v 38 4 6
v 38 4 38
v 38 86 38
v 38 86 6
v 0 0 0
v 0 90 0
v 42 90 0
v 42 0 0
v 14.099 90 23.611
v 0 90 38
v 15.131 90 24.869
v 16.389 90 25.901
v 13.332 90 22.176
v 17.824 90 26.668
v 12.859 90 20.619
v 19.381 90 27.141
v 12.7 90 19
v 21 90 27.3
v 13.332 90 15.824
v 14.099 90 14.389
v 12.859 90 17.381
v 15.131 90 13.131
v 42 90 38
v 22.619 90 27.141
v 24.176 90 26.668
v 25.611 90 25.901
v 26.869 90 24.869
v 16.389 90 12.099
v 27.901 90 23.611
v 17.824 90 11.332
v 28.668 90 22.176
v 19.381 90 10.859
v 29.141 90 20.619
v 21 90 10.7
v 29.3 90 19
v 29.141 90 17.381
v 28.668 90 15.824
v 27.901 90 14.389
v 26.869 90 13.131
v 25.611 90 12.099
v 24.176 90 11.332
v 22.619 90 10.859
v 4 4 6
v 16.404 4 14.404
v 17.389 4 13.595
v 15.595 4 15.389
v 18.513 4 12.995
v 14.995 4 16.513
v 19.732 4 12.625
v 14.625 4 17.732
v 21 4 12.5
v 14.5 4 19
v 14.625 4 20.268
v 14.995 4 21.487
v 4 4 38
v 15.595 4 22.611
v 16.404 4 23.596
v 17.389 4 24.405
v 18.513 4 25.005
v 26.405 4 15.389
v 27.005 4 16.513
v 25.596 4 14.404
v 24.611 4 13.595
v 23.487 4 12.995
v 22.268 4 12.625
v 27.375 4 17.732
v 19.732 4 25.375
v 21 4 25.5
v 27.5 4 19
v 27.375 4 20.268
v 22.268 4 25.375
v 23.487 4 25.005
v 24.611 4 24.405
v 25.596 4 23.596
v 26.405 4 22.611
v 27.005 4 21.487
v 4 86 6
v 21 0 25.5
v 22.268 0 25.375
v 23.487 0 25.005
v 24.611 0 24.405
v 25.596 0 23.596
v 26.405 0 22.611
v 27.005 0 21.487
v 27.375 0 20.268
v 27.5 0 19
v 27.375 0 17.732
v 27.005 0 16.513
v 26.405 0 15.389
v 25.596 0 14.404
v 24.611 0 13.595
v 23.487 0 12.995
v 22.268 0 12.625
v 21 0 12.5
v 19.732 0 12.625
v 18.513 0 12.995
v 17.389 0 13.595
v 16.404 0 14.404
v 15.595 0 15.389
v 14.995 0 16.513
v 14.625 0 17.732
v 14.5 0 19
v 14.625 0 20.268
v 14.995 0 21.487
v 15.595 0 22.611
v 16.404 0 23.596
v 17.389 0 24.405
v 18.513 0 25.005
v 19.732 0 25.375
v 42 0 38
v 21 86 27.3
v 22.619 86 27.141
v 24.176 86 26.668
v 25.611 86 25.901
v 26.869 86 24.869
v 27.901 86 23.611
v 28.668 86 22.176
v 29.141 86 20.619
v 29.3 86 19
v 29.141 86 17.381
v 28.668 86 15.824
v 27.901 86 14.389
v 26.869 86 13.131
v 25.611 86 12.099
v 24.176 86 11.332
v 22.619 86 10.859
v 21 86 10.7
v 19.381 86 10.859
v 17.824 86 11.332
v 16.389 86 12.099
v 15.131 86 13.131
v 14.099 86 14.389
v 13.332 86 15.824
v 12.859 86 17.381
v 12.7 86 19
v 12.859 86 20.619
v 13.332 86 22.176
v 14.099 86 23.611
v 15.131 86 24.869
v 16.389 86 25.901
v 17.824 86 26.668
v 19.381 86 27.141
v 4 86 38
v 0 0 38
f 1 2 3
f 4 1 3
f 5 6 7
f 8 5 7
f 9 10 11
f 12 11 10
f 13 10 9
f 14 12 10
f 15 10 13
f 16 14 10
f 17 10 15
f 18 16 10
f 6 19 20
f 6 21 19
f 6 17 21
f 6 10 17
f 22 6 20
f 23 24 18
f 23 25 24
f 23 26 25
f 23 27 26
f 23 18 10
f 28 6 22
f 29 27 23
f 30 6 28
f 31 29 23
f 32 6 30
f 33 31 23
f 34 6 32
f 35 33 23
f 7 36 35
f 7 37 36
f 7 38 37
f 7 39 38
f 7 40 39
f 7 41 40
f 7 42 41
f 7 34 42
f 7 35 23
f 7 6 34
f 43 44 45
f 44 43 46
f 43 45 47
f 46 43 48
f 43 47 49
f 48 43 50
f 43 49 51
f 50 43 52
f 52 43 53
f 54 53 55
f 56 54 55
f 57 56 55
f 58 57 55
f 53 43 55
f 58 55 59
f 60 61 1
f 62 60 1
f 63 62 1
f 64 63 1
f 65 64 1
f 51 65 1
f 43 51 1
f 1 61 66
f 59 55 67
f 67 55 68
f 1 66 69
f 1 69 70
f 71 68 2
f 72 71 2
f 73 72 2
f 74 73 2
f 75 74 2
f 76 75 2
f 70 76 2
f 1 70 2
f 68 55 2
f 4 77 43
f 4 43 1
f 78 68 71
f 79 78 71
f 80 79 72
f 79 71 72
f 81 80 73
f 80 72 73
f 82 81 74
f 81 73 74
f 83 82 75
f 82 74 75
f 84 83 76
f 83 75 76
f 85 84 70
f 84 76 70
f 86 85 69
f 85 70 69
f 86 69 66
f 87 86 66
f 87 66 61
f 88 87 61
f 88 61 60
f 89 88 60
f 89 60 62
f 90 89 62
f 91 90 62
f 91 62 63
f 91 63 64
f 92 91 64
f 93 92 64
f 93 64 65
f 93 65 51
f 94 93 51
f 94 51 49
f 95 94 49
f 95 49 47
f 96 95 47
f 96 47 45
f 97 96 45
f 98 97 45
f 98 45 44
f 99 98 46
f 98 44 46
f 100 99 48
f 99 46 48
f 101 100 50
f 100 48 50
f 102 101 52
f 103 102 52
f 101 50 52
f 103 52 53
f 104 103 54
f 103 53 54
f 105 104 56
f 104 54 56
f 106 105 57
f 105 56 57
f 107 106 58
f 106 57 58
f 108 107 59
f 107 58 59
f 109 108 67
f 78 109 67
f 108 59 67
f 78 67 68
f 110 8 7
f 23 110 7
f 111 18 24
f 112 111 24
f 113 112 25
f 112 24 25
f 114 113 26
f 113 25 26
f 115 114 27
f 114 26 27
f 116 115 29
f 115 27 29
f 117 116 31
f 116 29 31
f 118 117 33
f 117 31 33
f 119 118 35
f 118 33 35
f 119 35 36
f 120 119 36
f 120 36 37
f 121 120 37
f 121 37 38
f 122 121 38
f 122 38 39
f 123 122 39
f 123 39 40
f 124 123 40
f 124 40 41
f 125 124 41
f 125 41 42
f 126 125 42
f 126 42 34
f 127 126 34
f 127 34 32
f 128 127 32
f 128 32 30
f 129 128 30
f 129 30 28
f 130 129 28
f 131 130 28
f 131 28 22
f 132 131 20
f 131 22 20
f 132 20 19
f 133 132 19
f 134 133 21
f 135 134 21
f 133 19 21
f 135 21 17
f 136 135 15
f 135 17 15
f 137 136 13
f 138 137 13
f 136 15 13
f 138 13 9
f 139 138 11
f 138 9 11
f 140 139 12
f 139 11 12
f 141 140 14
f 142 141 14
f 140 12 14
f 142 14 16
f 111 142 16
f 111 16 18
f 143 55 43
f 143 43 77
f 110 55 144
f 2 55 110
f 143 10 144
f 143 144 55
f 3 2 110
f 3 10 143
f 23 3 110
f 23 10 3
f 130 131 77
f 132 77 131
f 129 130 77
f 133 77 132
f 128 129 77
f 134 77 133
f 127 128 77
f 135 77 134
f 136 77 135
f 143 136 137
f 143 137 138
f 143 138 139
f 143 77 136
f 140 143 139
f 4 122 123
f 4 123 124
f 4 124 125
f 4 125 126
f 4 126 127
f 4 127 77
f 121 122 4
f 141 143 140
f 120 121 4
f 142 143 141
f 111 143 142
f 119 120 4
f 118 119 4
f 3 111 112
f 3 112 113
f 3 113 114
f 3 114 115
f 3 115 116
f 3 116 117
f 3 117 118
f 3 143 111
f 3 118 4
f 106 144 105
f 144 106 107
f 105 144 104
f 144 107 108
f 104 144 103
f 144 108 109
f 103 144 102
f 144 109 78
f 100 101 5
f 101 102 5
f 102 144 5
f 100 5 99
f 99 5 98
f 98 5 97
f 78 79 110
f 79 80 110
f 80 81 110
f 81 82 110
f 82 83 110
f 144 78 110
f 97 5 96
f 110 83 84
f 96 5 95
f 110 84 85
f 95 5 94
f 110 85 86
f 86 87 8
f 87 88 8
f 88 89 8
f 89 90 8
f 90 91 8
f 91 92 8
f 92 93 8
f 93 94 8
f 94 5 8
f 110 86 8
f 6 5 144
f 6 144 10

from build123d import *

# Parameters (mm, degrees)
SKETCH_1_W                = 42
SKETCH_1_H                = 90
HOUSING_ENVELOPE_DEPTH    = 38
SKETCH_2_W                = 34
SKETCH_2_H                = 82
FRONT_ACCESS_WINDOW_DEPTH = 32
SKETCH_3_R                = 6.5
AXIAL_PASSAGE_DEPTH       = 107.339080304
SKETCH_4_R                = 8.3
D16_CLEARANCE_DEPTH       = 4.3


with BuildPart() as part:
    # 草图1 → Housing_envelope (new body)
    with BuildSketch(Plane.XY):
        with Locations((21, 45)):
            Rectangle(SKETCH_1_W, SKETCH_1_H)
    extrude(amount=HOUSING_ENVELOPE_DEPTH)

    # 草图2 → Front_access_window (cut)
    with BuildSketch(Plane.XY.offset(38)):
        with Locations((21, 45)):
            Rectangle(SKETCH_2_W, SKETCH_2_H)
    extrude(amount=-FRONT_ACCESS_WINDOW_DEPTH, mode=Mode.SUBTRACT)

    # 草图3 → Axial_passage (cut, through all)
    with BuildSketch(Plane(origin=(0, 90, 0), x_dir=(1, 0, 0), z_dir=(0, 1, 0))):
        with Locations(Location((21, -19, 0), (0, 0, 270))):
            Circle(SKETCH_3_R)
    extrude(amount=-AXIAL_PASSAGE_DEPTH, mode=Mode.SUBTRACT)

    # 草图4 → D16_clearance (cut)
    with BuildSketch(Plane(origin=(0, 90, 0), x_dir=(1, 0, 0), z_dir=(0, 1, 0))):
        with Locations(Location((21, -19, 0), (0, 0, 270))):
            Circle(SKETCH_4_R)
    extrude(amount=-D16_CLEARANCE_DEPTH, mode=Mode.SUBTRACT)


solid = part.part
